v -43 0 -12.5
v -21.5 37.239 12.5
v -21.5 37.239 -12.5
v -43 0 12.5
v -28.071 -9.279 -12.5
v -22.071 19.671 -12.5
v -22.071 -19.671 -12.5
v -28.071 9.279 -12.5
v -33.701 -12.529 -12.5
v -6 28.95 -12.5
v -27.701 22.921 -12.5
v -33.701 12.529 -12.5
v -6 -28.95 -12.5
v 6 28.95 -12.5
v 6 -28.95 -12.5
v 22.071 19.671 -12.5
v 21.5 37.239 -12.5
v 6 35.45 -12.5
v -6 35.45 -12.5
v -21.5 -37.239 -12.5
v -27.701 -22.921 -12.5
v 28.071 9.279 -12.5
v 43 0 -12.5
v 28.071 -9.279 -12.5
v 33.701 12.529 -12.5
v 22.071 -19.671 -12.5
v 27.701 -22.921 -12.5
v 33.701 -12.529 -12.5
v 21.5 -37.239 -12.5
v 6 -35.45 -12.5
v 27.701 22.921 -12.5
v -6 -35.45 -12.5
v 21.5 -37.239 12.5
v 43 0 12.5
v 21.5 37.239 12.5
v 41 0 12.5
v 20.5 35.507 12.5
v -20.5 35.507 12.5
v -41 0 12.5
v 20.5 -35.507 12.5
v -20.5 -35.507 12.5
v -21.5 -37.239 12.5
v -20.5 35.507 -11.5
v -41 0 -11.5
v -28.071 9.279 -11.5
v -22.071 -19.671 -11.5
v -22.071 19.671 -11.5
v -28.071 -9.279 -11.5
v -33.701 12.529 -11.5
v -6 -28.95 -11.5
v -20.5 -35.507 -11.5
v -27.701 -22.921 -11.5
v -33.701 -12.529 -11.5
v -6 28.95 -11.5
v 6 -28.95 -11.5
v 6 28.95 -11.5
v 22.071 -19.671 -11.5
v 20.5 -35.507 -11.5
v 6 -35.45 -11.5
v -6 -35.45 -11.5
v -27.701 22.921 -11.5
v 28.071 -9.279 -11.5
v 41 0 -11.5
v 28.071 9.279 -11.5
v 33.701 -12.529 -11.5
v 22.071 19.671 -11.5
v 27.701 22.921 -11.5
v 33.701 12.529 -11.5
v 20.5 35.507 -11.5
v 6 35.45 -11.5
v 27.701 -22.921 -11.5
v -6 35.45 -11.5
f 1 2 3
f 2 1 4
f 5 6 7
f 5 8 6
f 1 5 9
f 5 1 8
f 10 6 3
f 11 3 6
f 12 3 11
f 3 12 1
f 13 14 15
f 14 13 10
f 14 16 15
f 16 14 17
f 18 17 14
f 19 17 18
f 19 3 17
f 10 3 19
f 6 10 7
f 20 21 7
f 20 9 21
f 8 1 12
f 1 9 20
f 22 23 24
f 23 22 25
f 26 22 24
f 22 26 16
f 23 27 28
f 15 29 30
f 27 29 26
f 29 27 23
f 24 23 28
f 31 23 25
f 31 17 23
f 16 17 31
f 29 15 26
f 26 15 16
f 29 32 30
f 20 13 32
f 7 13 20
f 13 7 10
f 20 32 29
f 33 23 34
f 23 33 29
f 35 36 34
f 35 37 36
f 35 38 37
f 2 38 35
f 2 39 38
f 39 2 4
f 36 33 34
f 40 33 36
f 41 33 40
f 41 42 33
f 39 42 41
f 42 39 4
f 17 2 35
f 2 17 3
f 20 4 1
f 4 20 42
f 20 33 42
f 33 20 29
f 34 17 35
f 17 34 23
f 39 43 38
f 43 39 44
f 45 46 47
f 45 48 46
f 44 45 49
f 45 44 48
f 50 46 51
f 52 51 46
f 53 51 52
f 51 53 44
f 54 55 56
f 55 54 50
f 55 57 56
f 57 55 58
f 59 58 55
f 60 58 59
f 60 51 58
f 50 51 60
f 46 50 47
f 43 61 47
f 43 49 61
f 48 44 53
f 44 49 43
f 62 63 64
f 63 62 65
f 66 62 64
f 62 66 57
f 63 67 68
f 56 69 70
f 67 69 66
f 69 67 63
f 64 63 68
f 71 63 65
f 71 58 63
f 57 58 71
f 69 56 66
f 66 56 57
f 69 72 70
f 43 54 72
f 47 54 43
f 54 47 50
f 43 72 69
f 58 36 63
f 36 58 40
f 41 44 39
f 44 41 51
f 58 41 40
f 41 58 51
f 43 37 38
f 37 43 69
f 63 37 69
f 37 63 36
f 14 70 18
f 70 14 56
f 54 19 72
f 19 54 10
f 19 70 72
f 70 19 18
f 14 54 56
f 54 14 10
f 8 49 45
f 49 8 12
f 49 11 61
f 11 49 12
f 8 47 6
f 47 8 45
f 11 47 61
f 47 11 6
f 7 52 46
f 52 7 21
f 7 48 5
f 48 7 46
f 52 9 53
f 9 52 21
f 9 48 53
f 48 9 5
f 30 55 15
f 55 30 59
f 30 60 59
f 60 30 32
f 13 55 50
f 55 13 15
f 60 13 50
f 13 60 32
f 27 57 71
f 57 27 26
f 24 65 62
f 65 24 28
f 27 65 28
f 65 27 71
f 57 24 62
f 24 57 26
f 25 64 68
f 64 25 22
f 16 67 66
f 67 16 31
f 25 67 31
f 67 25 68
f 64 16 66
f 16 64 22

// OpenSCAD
// file: cololight_tribute_header.scad
/* 
Cololight like hexagon lights
*/

/* 
variable definitions
*/

hex_height=25;
hex_lon_d=86;
hex_short_d=74.478;
hex_incir_rad=43;
hex_lip_depth=1;
diffuser_thickness=2;
diffuser_lip_width=0;
diffuser_edge_thickness=1;
diffuser_clip_thickness=4;
diffuser_clip_wall_thickness=1;
base_thickness=1;
edge_thickness=2;
pin_header_width=8;
pin_header_height=2.5;
clip_mouth_width=12;
clip_mouth_length=6.5;
clip_edge_offset=4.3;

clip_width=12;
clip_length=(2*clip_mouth_length)+(2*edge_thickness);
clip_height=8+base_thickness;
// main file
/* 
Cololight like hexagon lights
*/

include <cololight_tribute_header.scad>

/*
hex_height=25;
hex_lon_d=86;
hex_short_d=74.478;
hex_incir_rad=43;
diffuser_thickness=2;
base_thickness=1;
edge_thickness=2;
pin_header_width=8;
pin_header_height=2.5;
clip_mouth_width=12;
clip_mouth_length=6.5;
clip_edge_offset=4.3;

clip_width=12;
clip_length=(2*clip_mouth_length)+(2*edge_thickness);
clip_height=8+base_thickness;
*/

/*
hexagonal light housing
*/

difference() {
    
    difference() {
    
        difference() {
            linear_extrude(height = hex_height, center = true, convexity = 10, twist = 0){
            circle(r=hex_incir_rad, $fn=6);
            }
            translate([0,0,base_thickness]){
                linear_extrude(height = hex_height, center = true, convexity = 10, twist = 0){
                    circle(r=hex_incir_rad-edge_thickness, $fn=6);
                }
            }
        }
        
        translate([0,0,(hex_height/2)]){
            linear_extrude(height = diffuser_thickness-(edge_thickness-diffuser_lip_width), center = true, convexity = 10, twist = 0){
                circle(r=hex_incir_rad-1, $fn=6);
            }
        }
    }
    
    
    for(a=[0:1:5]){
        rotate([0,0,a*60]) translate([0,hex_incir_rad-clip_mouth_length-clip_edge_offset
    ,0]) {
            cube( size=[clip_mouth_width,clip_mouth_length,hex_height*2], center=true);
        }    
    }    


    
}
